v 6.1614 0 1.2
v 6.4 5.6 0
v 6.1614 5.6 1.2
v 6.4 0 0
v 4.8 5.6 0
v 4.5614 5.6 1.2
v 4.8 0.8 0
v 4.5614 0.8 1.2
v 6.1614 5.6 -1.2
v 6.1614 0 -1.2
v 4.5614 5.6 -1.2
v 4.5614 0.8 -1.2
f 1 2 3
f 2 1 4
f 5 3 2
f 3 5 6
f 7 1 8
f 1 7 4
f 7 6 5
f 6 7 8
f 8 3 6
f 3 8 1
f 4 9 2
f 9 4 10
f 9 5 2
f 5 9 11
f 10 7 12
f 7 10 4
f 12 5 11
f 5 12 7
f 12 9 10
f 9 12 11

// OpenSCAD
// file: ../../p/rect2p.scad
use <../lib.scad>
function ldraw_lib__rect2p() = [
// 0 Rectangle with 2 Parallel Edges
// 0 Name: rect2p.dat
// 0 Author: Donald Sutter [technog]
// 0 !LDRAW_ORG Primitive UPDATE 2010-01
// 0 !LICENSE Licensed under CC BY 4.0 : see CAreadme.txt
// 
// 0 BFC CERTIFY CCW
  [0,"BFC","CERTIFY"],
  [0,"BFC","CCW"],
// 
// 0 !HISTORY 2003-08-01 [PTadmin] Official Update 2003-02
// 0 !HISTORY 2007-06-24 [PTadmin] Header formatted for Contributor Agreement
// 0 !HISTORY 2008-07-01 [PTadmin] Official Update 2008-01
// 0 !HISTORY 2010-01-17 [mikeheide] changed winding to CCW
// 0 !HISTORY 2010-04-05 [PTadmin] Official Update 2010-01
// 
// 
// 2 24 1 0 1 -1 0 1
  [2,24,1,0,1,-1,0,1],
// 2 24 -1 0 -1 1 0 -1
  [2,24,-1,0,-1,1,0,-1],
// 4 16 -1 0 1 -1 0 -1 1 0 -1 1 0 1
  [4,16,-1,0,1,-1,0,-1,1,0,-1,1,0,1],
// 0
];
module ldraw_lib__rect2p(step=0, col=false, unit=2/5, alt=false, line=0.2, solid=!$preview)
    makepoly(ldraw_lib__rect2p(), step=step, col=col, unit=unit, alt=alt, line=line, solid=solid);
ldraw_lib__rect2p(line=0.2);
// main file
use <../../lib.scad>
use <../../p/rect2p.scad>
function ldraw_lib__s__u9465s02() = [
// 0 ~Electric Powered Up Distance Sensor Lighting Ring Separator
// 0 Name: s\u9465s02.dat
// 0 Author: Philippe Hurbain [Philo]
// 0 !LDRAW_ORG Subpart UPDATE 2020-03
// 0 !LICENSE Licensed under CC BY 4.0 : see CAreadme.txt
// 
// 0 BFC CERTIFY CCW
  [0,"BFC","CERTIFY"],
  [0,"BFC","CCW"],
// 
// 0 !HISTORY 2019-12-27 [PTadmin] Official Update 2019-03
// 0 !HISTORY 2020-12-27 [PTadmin] Update description
// 0 !HISTORY 2020-12-29 [PTadmin] Official Update 2020-03
// 
// 
// 2 24 15.4034 -3 0 16 0 0
  [2,24,15.4034,-3,0,16,0,0],
// 2 24 11.4034 -3 2 12 0 2
  [2,24,11.4034,-3,2,12,0,2],
// 4 16 15.4034 -3 14 15.4034 -3 0 16 0 0 16 0 14
  [4,16,15.4034,-3,14,15.4034,-3,0,16,0,0,16,0,14],
// 1 16 13.7017 -1.5 14 -0.2983 0 2 -1.5 0 0 0 -1 0 rect2p.dat
  [1,16,13.7017,-1.5,14,-0.2983,0,2,-1.5,0,0,0,-1,0, ldraw_lib__rect2p()],
// 4 16 15.4034 -3 0 11.4034 -3 2 12 0 2 16 0 0
  [4,16,15.4034,-3,0,11.4034,-3,2,12,0,2,16,0,0],
// 4 16 12 0 2 11.4034 -3 2 11.4034 -3 14 12 0 14
  [4,16,12,0,2,11.4034,-3,2,11.4034,-3,14,12,0,14],
// 4 16 11.4034 -3 14 11.4034 -3 2 15.4034 -3 0 15.4034 -3 14
  [4,16,11.4034,-3,14,11.4034,-3,2,15.4034,-3,0,15.4034,-3,14],
// 2 24 15.4034 3 0 16 0 0
  [2,24,15.4034,3,0,16,0,0],
// 2 24 11.4034 3 2 12 0 2
  [2,24,11.4034,3,2,12,0,2],
// 4 16 16 0 0 15.4034 3 0 15.4034 3 14 16 0 14
  [4,16,16,0,0,15.4034,3,0,15.4034,3,14,16,0,14],
// 1 16 13.7017 1.5 14 0.2983 0 2 -1.5 0 0 0 -1 0 rect2p.dat
  [1,16,13.7017,1.5,14,0.2983,0,2,-1.5,0,0,0,-1,0, ldraw_lib__rect2p()],
// 4 16 12 0 2 11.4034 3 2 15.4034 3 0 16 0 0
  [4,16,12,0,2,11.4034,3,2,15.4034,3,0,16,0,0],
// 4 16 11.4034 3 14 11.4034 3 2 12 0 2 12 0 14
  [4,16,11.4034,3,14,11.4034,3,2,12,0,2,12,0,14],
// 4 16 15.4034 3 0 11.4034 3 2 11.4034 3 14 15.4034 3 14
  [4,16,15.4034,3,0,11.4034,3,2,11.4034,3,14,15.4034,3,14],
// 5 24 12 0 14 12 0 2 11.4034 -3 2 11.4034 3 2
  [5,24,12,0,14,12,0,2,11.4034,-3,2,11.4034,3,2],
// 5 24 12 0 2 16 0 0 15.4034 -3 0 15.4034 3 0
  [5,24,12,0,2,16,0,0,15.4034,-3,0,15.4034,3,0],
// 5 24 16 0 14 16 0 0 15.4034 -3 0 15.4034 3 0
  [5,24,16,0,14,16,0,0,15.4034,-3,0,15.4034,3,0],
];
module ldraw_lib__s__u9465s02(step=0, col=false, unit=2/5, alt=false, line=0.2, solid=!$preview)
    makepoly(ldraw_lib__s__u9465s02(), step=step, col=col, unit=unit, alt=alt, line=line, solid=solid);
ldraw_lib__s__u9465s02(line=0.2);
